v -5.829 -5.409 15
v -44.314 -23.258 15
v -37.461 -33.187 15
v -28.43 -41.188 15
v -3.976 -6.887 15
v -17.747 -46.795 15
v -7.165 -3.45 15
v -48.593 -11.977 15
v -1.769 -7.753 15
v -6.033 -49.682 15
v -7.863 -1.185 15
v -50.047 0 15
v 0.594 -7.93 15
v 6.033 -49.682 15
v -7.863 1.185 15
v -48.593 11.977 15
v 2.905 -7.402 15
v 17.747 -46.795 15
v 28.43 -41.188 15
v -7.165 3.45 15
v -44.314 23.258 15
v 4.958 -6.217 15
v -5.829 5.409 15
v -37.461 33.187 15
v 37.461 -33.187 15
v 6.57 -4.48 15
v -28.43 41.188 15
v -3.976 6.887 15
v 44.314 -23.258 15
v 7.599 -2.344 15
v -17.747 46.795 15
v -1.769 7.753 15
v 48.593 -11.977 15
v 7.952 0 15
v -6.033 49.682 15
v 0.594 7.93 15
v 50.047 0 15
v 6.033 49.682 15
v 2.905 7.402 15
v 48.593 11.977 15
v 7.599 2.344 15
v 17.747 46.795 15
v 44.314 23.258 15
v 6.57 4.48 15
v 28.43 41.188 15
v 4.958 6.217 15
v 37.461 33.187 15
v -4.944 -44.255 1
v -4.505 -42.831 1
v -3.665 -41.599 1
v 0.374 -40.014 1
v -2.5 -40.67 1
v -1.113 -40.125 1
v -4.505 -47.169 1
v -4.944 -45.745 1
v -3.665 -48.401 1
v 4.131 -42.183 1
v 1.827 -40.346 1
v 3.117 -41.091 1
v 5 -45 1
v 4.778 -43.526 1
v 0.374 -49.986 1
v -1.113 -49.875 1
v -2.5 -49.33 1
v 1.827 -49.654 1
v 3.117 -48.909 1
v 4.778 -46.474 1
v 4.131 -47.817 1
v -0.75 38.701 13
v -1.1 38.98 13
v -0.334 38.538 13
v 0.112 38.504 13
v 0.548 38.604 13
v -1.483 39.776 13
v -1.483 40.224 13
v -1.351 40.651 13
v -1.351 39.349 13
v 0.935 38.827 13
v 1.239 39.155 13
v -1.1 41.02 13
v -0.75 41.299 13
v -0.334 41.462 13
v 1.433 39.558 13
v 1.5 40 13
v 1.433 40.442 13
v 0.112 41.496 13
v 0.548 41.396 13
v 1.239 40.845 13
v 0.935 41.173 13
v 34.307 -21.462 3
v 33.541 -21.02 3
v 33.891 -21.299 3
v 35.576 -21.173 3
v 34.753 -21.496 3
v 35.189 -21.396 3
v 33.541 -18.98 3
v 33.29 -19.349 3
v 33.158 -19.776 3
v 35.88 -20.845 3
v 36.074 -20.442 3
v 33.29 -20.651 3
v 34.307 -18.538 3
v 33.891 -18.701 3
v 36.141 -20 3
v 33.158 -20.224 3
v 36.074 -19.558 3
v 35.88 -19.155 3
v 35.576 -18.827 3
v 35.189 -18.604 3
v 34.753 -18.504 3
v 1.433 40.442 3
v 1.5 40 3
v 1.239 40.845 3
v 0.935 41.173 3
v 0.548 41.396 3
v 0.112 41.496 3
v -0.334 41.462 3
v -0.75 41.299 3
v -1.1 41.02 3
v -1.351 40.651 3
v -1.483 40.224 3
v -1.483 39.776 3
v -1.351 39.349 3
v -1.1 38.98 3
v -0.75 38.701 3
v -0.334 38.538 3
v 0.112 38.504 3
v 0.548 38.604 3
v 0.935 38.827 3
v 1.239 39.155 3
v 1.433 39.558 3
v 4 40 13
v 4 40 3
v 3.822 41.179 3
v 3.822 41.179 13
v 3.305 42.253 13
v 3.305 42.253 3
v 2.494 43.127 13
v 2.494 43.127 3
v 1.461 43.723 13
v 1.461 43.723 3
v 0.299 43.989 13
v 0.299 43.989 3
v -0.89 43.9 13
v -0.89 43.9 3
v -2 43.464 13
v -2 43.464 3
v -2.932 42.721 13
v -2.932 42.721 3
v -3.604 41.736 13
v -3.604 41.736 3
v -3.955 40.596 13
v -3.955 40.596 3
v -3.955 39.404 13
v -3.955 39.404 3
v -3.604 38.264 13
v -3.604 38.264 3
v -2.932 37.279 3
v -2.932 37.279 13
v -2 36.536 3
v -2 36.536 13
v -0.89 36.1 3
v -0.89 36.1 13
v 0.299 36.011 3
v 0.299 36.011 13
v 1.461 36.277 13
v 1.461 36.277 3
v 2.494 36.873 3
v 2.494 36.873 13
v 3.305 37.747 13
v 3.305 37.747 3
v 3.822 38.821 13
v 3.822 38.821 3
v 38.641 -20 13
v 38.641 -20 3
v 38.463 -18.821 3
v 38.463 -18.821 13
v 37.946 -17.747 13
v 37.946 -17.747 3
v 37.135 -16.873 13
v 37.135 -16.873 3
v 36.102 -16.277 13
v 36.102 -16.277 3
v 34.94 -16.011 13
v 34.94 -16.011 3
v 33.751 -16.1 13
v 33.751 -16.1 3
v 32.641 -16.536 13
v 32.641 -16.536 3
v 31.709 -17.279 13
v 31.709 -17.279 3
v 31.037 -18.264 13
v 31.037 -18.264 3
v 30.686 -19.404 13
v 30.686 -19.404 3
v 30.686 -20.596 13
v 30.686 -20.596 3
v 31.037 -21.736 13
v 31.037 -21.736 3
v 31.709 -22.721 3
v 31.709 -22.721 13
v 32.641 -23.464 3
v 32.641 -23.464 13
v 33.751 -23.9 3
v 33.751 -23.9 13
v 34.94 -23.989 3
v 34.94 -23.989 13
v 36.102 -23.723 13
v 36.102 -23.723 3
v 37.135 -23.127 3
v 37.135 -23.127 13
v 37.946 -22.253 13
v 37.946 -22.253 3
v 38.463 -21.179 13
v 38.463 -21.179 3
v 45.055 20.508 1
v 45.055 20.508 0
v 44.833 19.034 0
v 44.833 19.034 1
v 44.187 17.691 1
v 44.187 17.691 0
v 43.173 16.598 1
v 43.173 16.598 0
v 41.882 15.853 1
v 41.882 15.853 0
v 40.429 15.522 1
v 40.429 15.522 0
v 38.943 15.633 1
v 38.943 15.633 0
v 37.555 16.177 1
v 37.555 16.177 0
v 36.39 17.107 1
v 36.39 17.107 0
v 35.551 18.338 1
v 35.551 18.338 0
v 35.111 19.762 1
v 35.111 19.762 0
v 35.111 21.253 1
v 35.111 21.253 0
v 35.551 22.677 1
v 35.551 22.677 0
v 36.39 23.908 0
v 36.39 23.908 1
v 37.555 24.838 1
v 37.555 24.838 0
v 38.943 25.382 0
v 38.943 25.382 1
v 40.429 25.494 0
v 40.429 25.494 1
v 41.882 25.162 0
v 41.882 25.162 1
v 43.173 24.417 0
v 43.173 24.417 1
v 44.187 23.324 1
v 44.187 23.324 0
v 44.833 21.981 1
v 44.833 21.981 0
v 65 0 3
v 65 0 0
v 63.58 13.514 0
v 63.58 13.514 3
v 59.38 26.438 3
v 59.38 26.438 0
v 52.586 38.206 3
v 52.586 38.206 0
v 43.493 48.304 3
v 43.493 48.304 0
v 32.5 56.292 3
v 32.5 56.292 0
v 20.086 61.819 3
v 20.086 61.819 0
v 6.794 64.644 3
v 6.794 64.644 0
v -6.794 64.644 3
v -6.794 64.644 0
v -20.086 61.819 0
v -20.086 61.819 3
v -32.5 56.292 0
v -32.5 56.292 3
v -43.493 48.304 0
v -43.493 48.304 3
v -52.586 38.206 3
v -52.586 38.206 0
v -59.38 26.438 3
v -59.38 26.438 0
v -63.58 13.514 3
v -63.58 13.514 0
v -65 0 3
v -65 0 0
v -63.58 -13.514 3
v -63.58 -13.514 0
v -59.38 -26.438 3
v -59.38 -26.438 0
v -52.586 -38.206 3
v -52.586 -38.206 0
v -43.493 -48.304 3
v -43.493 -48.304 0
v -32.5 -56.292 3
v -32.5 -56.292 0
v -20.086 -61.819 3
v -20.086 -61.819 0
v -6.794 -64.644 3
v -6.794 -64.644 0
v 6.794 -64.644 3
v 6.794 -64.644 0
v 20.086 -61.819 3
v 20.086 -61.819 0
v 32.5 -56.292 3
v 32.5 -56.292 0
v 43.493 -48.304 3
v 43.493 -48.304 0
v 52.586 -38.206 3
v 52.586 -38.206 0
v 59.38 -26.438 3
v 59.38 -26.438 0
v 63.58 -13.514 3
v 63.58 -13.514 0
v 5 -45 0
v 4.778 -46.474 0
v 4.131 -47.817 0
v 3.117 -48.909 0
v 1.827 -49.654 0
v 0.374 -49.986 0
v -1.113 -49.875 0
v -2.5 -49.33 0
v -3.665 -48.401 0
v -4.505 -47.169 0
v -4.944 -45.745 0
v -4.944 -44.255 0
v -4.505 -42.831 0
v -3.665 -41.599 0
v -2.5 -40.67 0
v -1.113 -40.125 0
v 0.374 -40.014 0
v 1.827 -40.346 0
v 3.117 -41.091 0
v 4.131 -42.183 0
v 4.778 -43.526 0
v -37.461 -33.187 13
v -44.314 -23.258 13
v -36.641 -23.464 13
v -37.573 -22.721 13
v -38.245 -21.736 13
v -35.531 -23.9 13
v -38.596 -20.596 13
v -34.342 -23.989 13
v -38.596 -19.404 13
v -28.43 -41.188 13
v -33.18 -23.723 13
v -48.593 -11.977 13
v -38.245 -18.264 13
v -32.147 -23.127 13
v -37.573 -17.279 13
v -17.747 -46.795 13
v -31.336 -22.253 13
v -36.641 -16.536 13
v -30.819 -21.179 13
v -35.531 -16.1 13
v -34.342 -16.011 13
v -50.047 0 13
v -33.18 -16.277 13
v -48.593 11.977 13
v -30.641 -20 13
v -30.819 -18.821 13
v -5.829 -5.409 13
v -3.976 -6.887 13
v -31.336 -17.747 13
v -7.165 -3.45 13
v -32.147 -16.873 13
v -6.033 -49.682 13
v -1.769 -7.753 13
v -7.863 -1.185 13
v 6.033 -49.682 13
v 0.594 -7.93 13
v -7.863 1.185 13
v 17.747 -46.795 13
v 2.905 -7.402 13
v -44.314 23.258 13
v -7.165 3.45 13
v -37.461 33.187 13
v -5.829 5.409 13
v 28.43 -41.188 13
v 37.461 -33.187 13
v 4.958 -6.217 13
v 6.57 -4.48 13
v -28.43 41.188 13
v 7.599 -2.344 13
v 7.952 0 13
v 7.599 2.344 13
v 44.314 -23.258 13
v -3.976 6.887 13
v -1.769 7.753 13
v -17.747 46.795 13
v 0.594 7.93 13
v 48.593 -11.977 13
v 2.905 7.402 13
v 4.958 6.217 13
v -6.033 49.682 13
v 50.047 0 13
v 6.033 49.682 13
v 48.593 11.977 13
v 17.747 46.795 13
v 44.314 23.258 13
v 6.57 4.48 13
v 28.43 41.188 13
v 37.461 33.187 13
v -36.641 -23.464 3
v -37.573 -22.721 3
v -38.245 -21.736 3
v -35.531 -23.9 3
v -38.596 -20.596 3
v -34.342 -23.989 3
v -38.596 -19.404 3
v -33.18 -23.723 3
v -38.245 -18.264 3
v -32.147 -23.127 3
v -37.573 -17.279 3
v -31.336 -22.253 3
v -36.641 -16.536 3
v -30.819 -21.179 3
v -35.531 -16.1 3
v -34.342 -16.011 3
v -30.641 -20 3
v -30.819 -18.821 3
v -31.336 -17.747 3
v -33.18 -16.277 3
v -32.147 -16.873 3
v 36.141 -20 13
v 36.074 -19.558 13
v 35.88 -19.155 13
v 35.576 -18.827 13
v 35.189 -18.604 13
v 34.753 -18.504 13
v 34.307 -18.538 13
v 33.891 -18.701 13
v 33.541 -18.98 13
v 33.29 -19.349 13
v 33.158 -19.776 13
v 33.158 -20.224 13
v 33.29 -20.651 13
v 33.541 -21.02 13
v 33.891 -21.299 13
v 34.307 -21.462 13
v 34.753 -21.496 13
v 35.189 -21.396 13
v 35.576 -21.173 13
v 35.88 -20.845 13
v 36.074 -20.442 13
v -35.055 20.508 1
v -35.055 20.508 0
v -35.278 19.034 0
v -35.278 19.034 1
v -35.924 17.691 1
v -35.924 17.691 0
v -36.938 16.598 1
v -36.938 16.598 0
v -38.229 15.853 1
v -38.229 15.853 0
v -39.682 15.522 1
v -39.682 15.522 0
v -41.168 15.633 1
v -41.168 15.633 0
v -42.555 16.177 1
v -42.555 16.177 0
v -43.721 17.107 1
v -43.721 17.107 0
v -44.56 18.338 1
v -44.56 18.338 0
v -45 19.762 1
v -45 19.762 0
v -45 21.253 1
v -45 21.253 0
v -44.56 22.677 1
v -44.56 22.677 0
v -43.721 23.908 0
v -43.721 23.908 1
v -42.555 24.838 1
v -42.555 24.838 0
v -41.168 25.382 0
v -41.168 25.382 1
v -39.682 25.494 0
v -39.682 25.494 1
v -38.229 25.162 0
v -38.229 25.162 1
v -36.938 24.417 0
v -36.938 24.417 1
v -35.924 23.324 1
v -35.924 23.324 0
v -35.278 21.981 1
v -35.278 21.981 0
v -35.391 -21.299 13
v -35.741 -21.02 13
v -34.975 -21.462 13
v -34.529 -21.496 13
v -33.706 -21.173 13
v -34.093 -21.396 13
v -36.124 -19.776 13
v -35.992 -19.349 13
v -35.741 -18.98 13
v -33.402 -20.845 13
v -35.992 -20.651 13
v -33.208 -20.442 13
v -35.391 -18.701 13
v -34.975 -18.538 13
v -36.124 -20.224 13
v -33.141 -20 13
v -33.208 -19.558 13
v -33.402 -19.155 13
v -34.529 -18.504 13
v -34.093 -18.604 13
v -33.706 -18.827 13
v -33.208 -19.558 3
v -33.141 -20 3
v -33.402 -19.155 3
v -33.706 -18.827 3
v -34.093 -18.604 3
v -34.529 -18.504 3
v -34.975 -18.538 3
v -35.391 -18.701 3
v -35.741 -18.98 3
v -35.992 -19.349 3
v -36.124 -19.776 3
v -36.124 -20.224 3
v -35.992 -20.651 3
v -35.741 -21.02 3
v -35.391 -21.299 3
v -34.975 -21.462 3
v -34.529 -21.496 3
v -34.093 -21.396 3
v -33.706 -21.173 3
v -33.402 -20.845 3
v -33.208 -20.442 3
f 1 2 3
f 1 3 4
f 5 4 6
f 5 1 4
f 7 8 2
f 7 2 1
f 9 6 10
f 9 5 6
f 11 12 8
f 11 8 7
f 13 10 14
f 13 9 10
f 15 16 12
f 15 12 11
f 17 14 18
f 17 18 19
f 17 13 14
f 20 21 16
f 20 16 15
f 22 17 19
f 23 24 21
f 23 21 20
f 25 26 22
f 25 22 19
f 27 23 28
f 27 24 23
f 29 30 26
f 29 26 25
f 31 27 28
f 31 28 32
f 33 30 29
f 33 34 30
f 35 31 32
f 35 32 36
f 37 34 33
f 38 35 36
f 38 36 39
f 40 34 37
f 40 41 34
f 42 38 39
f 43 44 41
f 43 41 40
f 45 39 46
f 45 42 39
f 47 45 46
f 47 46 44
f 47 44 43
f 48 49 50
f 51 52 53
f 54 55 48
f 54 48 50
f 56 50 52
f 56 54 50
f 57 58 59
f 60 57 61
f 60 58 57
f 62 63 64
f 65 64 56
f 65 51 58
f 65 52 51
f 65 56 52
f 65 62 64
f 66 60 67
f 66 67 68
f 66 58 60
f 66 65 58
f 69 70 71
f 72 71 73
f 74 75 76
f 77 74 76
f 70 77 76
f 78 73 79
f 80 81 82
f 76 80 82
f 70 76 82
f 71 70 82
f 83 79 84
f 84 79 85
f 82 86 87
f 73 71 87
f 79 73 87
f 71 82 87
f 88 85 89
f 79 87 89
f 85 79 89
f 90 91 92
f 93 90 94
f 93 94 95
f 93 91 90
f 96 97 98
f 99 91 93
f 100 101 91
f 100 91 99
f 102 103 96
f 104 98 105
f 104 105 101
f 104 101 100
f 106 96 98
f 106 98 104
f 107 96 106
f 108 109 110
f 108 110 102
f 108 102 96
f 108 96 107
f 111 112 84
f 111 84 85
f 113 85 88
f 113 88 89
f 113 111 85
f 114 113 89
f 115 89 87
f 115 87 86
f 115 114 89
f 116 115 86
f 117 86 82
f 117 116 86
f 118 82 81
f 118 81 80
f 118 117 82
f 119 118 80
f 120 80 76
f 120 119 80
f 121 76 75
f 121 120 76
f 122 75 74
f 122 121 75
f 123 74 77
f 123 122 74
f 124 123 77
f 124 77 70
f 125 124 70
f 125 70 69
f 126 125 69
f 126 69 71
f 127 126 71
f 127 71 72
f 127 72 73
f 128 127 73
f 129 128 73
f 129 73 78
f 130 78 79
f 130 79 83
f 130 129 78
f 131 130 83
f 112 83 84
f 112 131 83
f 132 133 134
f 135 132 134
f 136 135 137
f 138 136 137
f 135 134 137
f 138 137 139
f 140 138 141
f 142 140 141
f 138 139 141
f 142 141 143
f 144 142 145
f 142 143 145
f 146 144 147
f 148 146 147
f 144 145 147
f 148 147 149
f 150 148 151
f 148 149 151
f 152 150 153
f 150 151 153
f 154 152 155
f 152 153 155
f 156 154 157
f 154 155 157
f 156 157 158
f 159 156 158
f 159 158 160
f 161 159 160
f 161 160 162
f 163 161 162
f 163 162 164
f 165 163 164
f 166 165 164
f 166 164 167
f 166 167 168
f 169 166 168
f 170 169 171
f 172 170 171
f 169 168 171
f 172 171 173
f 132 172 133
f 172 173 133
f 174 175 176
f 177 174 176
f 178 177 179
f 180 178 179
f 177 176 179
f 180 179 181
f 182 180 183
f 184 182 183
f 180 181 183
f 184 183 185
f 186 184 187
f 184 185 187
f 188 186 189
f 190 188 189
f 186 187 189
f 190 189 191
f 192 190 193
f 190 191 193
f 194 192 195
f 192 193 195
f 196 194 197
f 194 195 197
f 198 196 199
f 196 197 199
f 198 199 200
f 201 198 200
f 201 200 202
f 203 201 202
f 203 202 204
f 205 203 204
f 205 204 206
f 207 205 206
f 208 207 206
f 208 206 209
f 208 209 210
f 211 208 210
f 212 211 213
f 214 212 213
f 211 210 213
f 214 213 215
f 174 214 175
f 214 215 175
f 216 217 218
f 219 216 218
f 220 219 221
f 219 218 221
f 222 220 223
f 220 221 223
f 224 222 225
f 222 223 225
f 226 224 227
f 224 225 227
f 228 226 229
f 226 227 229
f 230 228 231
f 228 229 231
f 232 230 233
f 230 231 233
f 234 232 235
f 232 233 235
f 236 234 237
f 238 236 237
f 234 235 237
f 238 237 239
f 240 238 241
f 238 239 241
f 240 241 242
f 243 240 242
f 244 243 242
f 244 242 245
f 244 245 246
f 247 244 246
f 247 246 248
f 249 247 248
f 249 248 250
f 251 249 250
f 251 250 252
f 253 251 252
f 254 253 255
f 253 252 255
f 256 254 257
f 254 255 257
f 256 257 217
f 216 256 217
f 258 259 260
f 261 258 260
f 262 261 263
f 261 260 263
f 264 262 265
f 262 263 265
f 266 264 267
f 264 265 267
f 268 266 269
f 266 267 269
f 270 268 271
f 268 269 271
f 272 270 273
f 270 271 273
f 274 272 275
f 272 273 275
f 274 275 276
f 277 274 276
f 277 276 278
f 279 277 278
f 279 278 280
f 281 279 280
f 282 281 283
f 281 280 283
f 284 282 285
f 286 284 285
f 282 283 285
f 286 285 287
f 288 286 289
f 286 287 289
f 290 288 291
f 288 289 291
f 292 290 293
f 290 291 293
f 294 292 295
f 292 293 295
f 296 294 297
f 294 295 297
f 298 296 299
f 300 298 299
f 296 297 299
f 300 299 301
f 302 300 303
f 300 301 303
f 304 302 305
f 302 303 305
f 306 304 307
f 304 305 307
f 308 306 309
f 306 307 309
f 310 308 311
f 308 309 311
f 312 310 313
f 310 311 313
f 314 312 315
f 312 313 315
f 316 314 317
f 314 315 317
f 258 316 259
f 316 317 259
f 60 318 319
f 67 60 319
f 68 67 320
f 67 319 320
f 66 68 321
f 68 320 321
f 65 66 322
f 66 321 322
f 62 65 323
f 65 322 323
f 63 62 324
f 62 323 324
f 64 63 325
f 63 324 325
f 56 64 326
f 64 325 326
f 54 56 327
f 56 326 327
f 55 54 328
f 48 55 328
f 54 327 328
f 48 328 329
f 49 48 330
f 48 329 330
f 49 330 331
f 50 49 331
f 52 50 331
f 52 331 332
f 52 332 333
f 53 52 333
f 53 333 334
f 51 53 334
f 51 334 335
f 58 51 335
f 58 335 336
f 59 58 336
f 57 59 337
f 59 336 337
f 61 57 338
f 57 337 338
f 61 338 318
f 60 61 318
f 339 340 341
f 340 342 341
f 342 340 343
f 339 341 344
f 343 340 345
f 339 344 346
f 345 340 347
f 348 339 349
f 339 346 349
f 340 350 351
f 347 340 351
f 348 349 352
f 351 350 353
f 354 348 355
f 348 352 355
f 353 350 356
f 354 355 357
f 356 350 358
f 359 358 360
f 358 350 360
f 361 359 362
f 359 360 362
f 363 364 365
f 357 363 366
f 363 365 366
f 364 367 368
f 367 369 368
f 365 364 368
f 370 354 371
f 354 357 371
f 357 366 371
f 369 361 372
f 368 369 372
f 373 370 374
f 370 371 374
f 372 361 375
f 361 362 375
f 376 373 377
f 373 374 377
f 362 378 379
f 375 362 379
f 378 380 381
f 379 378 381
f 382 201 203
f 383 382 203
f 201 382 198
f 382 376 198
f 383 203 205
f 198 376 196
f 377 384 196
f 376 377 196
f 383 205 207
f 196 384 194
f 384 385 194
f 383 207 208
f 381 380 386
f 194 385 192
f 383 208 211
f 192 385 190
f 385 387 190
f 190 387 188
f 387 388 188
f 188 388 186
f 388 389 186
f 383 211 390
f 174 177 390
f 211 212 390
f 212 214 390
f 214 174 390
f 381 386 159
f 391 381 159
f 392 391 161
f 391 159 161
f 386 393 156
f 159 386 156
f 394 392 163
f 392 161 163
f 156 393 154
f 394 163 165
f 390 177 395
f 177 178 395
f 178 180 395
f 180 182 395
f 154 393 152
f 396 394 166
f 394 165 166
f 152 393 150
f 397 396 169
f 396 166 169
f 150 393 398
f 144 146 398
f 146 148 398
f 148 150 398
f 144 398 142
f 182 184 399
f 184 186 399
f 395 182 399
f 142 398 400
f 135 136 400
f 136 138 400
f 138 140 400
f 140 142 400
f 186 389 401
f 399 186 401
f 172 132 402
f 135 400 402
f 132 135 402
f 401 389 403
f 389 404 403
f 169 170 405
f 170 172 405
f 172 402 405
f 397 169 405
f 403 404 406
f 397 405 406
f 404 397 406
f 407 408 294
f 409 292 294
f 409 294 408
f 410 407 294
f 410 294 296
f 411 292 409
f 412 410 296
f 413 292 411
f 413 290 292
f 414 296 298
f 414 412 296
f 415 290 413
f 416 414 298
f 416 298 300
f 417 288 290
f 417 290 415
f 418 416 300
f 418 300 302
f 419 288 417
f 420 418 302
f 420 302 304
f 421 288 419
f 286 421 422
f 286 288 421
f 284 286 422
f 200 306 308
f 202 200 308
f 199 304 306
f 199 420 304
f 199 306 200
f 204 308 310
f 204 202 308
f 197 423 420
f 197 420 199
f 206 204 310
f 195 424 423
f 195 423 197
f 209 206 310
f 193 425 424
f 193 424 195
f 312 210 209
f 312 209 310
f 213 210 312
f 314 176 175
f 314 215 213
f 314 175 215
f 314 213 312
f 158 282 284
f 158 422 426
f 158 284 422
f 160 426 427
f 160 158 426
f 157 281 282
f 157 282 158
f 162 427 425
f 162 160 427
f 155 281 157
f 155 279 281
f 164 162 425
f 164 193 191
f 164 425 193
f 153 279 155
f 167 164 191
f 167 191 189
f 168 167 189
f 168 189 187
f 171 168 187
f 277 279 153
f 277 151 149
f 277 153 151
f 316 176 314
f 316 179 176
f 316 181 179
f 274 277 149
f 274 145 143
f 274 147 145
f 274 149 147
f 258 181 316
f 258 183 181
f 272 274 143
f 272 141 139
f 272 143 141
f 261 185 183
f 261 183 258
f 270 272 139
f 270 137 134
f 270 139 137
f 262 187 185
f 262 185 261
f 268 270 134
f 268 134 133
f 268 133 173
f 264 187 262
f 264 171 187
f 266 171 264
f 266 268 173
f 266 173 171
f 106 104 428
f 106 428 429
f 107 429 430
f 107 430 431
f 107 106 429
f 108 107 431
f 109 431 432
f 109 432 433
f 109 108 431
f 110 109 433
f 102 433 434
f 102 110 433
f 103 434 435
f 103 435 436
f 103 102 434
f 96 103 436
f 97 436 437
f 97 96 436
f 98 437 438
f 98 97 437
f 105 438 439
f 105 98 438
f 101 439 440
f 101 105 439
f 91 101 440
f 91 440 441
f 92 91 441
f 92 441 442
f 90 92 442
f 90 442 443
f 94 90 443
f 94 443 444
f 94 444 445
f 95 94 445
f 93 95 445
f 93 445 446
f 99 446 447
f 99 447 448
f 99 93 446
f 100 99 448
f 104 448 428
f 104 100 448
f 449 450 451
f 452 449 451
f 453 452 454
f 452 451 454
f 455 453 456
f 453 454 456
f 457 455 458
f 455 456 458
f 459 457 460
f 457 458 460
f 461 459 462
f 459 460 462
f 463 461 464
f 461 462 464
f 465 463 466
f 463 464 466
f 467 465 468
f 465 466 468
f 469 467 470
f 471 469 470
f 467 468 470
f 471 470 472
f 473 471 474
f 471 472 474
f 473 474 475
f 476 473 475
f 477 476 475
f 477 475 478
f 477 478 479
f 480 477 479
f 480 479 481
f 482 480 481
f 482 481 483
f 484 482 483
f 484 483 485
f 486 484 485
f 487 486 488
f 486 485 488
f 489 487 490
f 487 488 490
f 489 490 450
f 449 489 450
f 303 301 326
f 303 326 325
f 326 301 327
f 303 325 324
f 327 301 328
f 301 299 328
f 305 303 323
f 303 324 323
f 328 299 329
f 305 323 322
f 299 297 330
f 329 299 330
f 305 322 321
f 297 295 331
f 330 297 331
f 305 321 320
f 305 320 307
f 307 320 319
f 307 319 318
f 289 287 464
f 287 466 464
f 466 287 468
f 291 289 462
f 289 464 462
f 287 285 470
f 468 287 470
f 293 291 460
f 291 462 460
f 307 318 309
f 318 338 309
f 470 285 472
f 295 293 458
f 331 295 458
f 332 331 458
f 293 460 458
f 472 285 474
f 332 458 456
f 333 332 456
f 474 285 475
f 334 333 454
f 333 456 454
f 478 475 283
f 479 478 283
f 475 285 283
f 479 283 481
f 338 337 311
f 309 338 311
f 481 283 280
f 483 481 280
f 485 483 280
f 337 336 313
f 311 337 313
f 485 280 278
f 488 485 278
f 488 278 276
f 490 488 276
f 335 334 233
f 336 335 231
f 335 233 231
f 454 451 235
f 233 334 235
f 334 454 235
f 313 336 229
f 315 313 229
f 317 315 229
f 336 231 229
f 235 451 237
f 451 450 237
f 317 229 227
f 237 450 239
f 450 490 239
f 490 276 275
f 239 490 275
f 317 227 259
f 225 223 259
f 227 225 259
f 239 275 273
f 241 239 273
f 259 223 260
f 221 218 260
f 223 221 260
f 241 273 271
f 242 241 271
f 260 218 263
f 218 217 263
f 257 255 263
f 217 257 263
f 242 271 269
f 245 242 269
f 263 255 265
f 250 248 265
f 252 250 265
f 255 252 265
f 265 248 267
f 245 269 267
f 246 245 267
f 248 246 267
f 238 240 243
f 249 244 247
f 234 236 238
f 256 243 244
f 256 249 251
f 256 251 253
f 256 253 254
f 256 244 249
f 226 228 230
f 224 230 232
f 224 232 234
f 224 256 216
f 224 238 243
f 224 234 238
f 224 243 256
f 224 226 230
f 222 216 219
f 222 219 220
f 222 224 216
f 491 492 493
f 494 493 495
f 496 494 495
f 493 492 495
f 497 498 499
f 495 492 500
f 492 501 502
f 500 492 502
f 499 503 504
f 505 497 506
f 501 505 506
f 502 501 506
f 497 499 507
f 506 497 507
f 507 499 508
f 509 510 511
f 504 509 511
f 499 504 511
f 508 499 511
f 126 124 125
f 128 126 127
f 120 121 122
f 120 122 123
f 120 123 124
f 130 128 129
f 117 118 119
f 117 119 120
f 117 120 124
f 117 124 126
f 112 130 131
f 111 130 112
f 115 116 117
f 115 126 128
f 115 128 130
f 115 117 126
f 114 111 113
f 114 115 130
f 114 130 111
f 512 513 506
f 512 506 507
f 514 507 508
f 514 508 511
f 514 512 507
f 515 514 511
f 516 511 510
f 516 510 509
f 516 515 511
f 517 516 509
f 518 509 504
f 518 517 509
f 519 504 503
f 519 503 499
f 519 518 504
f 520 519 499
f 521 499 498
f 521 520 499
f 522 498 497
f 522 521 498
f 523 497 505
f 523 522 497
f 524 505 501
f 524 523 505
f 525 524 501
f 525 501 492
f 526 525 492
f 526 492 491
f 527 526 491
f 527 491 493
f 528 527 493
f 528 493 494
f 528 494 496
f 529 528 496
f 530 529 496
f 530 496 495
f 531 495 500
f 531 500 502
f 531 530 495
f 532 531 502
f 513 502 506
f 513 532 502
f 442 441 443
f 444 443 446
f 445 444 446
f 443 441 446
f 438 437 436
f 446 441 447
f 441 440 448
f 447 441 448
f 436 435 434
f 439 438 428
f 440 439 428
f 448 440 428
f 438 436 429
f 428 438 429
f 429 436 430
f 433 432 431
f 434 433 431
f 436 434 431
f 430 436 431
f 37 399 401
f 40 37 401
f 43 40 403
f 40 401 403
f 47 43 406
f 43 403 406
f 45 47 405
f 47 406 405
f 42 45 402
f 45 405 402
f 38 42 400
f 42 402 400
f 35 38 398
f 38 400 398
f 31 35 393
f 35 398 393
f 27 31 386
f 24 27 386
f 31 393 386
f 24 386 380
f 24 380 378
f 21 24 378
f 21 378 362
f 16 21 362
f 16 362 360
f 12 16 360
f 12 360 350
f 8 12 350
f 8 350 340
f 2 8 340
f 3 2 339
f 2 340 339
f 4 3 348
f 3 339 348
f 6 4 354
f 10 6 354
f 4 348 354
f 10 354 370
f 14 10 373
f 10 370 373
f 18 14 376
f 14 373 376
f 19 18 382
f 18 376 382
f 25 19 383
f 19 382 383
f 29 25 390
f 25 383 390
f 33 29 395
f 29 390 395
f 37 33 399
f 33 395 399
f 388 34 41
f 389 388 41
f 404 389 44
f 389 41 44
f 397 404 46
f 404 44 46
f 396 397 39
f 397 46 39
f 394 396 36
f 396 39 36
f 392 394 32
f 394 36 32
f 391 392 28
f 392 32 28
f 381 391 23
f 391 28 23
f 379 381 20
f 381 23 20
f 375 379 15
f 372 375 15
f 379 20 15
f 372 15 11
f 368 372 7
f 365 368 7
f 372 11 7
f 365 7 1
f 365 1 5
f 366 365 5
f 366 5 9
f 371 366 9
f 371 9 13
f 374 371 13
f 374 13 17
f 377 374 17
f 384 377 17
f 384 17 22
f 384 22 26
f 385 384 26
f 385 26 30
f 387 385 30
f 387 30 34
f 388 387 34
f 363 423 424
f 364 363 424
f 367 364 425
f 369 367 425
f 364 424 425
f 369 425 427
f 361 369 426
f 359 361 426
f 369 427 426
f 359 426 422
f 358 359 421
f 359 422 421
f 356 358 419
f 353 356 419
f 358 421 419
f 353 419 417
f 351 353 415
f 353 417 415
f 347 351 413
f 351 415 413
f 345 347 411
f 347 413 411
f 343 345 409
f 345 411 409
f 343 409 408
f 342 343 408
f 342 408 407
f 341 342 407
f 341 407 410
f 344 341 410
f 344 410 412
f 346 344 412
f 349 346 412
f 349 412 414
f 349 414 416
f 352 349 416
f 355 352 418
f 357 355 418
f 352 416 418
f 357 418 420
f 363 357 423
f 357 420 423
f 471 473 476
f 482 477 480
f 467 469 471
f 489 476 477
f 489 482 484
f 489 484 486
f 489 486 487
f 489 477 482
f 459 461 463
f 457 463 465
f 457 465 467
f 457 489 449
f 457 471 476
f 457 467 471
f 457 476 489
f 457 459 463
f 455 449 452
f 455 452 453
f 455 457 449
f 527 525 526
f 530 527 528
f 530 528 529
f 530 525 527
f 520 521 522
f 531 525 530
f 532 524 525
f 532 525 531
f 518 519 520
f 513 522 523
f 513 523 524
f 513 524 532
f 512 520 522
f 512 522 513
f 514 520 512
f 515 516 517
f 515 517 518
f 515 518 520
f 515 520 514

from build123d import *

# Parameters (mm, degrees)
SKETCH_R        = 65
PAD_DEPTH       = 3
SKETCH001_R     = 5
POCKET_DEPTH    = 1
SKETCH003_R     = 4
SKETCH003_R_2   = 1.5
PAD001_DEPTH    = 10
SKETCH005_R     = 50.047019
PAD002_DEPTH    = 2
SKETCH007_R     = 7.952006
POCKET001_DEPTH = 5


with BuildPart() as part:
    # Sketch → Pad (new body)
    with BuildSketch(Plane.XY):
        Circle(SKETCH_R)
    extrude(amount=PAD_DEPTH)

    # Sketch001 (on Face2 of Pad) → Pocket (cut)
    with BuildSketch(Plane(origin=(0, 0, 0), x_dir=(1, 0, 0), z_dir=(0, 0, -1))):
        with Locations((0, 45)):
            Circle(SKETCH001_R)
        with Locations((40.055428, -20.507625)):
            Circle(SKETCH001_R)
        with Locations((-40.055428, -20.507625)):
            Circle(SKETCH001_R)
    extrude(amount=-POCKET_DEPTH, mode=Mode.SUBTRACT)

    # Sketch003 (on Face3 of Pocket) → Pad001 (join)
    with BuildSketch(Plane.XY.offset(3)):
        with Locations((0, 40)):
            Circle(SKETCH003_R)
        with Locations((0, 40)):
            Circle(SKETCH003_R_2, mode=Mode.SUBTRACT)
        with Locations((-34.641016, -20)):
            Circle(SKETCH003_R)
        with Locations((-34.641016, -20)):
            Circle(SKETCH003_R_2, mode=Mode.SUBTRACT)
        with Locations((34.641016, -20)):
            Circle(SKETCH003_R)
        with Locations((34.641016, -20)):
            Circle(SKETCH003_R_2, mode=Mode.SUBTRACT)
    extrude(amount=PAD001_DEPTH)

    # Sketch005 (on Face15 of Pad001) → Pad002 (join)
    with BuildSketch(Plane.XY.offset(13)):
        Circle(SKETCH005_R)
    extrude(amount=PAD002_DEPTH)

    # Sketch007 (on Face3 of Pad002) → Pocket001 (cut)
    with BuildSketch(Plane.XY.offset(15)):
        Circle(SKETCH007_R)
    extrude(amount=-POCKET001_DEPTH, mode=Mode.SUBTRACT)


solid = part.part
